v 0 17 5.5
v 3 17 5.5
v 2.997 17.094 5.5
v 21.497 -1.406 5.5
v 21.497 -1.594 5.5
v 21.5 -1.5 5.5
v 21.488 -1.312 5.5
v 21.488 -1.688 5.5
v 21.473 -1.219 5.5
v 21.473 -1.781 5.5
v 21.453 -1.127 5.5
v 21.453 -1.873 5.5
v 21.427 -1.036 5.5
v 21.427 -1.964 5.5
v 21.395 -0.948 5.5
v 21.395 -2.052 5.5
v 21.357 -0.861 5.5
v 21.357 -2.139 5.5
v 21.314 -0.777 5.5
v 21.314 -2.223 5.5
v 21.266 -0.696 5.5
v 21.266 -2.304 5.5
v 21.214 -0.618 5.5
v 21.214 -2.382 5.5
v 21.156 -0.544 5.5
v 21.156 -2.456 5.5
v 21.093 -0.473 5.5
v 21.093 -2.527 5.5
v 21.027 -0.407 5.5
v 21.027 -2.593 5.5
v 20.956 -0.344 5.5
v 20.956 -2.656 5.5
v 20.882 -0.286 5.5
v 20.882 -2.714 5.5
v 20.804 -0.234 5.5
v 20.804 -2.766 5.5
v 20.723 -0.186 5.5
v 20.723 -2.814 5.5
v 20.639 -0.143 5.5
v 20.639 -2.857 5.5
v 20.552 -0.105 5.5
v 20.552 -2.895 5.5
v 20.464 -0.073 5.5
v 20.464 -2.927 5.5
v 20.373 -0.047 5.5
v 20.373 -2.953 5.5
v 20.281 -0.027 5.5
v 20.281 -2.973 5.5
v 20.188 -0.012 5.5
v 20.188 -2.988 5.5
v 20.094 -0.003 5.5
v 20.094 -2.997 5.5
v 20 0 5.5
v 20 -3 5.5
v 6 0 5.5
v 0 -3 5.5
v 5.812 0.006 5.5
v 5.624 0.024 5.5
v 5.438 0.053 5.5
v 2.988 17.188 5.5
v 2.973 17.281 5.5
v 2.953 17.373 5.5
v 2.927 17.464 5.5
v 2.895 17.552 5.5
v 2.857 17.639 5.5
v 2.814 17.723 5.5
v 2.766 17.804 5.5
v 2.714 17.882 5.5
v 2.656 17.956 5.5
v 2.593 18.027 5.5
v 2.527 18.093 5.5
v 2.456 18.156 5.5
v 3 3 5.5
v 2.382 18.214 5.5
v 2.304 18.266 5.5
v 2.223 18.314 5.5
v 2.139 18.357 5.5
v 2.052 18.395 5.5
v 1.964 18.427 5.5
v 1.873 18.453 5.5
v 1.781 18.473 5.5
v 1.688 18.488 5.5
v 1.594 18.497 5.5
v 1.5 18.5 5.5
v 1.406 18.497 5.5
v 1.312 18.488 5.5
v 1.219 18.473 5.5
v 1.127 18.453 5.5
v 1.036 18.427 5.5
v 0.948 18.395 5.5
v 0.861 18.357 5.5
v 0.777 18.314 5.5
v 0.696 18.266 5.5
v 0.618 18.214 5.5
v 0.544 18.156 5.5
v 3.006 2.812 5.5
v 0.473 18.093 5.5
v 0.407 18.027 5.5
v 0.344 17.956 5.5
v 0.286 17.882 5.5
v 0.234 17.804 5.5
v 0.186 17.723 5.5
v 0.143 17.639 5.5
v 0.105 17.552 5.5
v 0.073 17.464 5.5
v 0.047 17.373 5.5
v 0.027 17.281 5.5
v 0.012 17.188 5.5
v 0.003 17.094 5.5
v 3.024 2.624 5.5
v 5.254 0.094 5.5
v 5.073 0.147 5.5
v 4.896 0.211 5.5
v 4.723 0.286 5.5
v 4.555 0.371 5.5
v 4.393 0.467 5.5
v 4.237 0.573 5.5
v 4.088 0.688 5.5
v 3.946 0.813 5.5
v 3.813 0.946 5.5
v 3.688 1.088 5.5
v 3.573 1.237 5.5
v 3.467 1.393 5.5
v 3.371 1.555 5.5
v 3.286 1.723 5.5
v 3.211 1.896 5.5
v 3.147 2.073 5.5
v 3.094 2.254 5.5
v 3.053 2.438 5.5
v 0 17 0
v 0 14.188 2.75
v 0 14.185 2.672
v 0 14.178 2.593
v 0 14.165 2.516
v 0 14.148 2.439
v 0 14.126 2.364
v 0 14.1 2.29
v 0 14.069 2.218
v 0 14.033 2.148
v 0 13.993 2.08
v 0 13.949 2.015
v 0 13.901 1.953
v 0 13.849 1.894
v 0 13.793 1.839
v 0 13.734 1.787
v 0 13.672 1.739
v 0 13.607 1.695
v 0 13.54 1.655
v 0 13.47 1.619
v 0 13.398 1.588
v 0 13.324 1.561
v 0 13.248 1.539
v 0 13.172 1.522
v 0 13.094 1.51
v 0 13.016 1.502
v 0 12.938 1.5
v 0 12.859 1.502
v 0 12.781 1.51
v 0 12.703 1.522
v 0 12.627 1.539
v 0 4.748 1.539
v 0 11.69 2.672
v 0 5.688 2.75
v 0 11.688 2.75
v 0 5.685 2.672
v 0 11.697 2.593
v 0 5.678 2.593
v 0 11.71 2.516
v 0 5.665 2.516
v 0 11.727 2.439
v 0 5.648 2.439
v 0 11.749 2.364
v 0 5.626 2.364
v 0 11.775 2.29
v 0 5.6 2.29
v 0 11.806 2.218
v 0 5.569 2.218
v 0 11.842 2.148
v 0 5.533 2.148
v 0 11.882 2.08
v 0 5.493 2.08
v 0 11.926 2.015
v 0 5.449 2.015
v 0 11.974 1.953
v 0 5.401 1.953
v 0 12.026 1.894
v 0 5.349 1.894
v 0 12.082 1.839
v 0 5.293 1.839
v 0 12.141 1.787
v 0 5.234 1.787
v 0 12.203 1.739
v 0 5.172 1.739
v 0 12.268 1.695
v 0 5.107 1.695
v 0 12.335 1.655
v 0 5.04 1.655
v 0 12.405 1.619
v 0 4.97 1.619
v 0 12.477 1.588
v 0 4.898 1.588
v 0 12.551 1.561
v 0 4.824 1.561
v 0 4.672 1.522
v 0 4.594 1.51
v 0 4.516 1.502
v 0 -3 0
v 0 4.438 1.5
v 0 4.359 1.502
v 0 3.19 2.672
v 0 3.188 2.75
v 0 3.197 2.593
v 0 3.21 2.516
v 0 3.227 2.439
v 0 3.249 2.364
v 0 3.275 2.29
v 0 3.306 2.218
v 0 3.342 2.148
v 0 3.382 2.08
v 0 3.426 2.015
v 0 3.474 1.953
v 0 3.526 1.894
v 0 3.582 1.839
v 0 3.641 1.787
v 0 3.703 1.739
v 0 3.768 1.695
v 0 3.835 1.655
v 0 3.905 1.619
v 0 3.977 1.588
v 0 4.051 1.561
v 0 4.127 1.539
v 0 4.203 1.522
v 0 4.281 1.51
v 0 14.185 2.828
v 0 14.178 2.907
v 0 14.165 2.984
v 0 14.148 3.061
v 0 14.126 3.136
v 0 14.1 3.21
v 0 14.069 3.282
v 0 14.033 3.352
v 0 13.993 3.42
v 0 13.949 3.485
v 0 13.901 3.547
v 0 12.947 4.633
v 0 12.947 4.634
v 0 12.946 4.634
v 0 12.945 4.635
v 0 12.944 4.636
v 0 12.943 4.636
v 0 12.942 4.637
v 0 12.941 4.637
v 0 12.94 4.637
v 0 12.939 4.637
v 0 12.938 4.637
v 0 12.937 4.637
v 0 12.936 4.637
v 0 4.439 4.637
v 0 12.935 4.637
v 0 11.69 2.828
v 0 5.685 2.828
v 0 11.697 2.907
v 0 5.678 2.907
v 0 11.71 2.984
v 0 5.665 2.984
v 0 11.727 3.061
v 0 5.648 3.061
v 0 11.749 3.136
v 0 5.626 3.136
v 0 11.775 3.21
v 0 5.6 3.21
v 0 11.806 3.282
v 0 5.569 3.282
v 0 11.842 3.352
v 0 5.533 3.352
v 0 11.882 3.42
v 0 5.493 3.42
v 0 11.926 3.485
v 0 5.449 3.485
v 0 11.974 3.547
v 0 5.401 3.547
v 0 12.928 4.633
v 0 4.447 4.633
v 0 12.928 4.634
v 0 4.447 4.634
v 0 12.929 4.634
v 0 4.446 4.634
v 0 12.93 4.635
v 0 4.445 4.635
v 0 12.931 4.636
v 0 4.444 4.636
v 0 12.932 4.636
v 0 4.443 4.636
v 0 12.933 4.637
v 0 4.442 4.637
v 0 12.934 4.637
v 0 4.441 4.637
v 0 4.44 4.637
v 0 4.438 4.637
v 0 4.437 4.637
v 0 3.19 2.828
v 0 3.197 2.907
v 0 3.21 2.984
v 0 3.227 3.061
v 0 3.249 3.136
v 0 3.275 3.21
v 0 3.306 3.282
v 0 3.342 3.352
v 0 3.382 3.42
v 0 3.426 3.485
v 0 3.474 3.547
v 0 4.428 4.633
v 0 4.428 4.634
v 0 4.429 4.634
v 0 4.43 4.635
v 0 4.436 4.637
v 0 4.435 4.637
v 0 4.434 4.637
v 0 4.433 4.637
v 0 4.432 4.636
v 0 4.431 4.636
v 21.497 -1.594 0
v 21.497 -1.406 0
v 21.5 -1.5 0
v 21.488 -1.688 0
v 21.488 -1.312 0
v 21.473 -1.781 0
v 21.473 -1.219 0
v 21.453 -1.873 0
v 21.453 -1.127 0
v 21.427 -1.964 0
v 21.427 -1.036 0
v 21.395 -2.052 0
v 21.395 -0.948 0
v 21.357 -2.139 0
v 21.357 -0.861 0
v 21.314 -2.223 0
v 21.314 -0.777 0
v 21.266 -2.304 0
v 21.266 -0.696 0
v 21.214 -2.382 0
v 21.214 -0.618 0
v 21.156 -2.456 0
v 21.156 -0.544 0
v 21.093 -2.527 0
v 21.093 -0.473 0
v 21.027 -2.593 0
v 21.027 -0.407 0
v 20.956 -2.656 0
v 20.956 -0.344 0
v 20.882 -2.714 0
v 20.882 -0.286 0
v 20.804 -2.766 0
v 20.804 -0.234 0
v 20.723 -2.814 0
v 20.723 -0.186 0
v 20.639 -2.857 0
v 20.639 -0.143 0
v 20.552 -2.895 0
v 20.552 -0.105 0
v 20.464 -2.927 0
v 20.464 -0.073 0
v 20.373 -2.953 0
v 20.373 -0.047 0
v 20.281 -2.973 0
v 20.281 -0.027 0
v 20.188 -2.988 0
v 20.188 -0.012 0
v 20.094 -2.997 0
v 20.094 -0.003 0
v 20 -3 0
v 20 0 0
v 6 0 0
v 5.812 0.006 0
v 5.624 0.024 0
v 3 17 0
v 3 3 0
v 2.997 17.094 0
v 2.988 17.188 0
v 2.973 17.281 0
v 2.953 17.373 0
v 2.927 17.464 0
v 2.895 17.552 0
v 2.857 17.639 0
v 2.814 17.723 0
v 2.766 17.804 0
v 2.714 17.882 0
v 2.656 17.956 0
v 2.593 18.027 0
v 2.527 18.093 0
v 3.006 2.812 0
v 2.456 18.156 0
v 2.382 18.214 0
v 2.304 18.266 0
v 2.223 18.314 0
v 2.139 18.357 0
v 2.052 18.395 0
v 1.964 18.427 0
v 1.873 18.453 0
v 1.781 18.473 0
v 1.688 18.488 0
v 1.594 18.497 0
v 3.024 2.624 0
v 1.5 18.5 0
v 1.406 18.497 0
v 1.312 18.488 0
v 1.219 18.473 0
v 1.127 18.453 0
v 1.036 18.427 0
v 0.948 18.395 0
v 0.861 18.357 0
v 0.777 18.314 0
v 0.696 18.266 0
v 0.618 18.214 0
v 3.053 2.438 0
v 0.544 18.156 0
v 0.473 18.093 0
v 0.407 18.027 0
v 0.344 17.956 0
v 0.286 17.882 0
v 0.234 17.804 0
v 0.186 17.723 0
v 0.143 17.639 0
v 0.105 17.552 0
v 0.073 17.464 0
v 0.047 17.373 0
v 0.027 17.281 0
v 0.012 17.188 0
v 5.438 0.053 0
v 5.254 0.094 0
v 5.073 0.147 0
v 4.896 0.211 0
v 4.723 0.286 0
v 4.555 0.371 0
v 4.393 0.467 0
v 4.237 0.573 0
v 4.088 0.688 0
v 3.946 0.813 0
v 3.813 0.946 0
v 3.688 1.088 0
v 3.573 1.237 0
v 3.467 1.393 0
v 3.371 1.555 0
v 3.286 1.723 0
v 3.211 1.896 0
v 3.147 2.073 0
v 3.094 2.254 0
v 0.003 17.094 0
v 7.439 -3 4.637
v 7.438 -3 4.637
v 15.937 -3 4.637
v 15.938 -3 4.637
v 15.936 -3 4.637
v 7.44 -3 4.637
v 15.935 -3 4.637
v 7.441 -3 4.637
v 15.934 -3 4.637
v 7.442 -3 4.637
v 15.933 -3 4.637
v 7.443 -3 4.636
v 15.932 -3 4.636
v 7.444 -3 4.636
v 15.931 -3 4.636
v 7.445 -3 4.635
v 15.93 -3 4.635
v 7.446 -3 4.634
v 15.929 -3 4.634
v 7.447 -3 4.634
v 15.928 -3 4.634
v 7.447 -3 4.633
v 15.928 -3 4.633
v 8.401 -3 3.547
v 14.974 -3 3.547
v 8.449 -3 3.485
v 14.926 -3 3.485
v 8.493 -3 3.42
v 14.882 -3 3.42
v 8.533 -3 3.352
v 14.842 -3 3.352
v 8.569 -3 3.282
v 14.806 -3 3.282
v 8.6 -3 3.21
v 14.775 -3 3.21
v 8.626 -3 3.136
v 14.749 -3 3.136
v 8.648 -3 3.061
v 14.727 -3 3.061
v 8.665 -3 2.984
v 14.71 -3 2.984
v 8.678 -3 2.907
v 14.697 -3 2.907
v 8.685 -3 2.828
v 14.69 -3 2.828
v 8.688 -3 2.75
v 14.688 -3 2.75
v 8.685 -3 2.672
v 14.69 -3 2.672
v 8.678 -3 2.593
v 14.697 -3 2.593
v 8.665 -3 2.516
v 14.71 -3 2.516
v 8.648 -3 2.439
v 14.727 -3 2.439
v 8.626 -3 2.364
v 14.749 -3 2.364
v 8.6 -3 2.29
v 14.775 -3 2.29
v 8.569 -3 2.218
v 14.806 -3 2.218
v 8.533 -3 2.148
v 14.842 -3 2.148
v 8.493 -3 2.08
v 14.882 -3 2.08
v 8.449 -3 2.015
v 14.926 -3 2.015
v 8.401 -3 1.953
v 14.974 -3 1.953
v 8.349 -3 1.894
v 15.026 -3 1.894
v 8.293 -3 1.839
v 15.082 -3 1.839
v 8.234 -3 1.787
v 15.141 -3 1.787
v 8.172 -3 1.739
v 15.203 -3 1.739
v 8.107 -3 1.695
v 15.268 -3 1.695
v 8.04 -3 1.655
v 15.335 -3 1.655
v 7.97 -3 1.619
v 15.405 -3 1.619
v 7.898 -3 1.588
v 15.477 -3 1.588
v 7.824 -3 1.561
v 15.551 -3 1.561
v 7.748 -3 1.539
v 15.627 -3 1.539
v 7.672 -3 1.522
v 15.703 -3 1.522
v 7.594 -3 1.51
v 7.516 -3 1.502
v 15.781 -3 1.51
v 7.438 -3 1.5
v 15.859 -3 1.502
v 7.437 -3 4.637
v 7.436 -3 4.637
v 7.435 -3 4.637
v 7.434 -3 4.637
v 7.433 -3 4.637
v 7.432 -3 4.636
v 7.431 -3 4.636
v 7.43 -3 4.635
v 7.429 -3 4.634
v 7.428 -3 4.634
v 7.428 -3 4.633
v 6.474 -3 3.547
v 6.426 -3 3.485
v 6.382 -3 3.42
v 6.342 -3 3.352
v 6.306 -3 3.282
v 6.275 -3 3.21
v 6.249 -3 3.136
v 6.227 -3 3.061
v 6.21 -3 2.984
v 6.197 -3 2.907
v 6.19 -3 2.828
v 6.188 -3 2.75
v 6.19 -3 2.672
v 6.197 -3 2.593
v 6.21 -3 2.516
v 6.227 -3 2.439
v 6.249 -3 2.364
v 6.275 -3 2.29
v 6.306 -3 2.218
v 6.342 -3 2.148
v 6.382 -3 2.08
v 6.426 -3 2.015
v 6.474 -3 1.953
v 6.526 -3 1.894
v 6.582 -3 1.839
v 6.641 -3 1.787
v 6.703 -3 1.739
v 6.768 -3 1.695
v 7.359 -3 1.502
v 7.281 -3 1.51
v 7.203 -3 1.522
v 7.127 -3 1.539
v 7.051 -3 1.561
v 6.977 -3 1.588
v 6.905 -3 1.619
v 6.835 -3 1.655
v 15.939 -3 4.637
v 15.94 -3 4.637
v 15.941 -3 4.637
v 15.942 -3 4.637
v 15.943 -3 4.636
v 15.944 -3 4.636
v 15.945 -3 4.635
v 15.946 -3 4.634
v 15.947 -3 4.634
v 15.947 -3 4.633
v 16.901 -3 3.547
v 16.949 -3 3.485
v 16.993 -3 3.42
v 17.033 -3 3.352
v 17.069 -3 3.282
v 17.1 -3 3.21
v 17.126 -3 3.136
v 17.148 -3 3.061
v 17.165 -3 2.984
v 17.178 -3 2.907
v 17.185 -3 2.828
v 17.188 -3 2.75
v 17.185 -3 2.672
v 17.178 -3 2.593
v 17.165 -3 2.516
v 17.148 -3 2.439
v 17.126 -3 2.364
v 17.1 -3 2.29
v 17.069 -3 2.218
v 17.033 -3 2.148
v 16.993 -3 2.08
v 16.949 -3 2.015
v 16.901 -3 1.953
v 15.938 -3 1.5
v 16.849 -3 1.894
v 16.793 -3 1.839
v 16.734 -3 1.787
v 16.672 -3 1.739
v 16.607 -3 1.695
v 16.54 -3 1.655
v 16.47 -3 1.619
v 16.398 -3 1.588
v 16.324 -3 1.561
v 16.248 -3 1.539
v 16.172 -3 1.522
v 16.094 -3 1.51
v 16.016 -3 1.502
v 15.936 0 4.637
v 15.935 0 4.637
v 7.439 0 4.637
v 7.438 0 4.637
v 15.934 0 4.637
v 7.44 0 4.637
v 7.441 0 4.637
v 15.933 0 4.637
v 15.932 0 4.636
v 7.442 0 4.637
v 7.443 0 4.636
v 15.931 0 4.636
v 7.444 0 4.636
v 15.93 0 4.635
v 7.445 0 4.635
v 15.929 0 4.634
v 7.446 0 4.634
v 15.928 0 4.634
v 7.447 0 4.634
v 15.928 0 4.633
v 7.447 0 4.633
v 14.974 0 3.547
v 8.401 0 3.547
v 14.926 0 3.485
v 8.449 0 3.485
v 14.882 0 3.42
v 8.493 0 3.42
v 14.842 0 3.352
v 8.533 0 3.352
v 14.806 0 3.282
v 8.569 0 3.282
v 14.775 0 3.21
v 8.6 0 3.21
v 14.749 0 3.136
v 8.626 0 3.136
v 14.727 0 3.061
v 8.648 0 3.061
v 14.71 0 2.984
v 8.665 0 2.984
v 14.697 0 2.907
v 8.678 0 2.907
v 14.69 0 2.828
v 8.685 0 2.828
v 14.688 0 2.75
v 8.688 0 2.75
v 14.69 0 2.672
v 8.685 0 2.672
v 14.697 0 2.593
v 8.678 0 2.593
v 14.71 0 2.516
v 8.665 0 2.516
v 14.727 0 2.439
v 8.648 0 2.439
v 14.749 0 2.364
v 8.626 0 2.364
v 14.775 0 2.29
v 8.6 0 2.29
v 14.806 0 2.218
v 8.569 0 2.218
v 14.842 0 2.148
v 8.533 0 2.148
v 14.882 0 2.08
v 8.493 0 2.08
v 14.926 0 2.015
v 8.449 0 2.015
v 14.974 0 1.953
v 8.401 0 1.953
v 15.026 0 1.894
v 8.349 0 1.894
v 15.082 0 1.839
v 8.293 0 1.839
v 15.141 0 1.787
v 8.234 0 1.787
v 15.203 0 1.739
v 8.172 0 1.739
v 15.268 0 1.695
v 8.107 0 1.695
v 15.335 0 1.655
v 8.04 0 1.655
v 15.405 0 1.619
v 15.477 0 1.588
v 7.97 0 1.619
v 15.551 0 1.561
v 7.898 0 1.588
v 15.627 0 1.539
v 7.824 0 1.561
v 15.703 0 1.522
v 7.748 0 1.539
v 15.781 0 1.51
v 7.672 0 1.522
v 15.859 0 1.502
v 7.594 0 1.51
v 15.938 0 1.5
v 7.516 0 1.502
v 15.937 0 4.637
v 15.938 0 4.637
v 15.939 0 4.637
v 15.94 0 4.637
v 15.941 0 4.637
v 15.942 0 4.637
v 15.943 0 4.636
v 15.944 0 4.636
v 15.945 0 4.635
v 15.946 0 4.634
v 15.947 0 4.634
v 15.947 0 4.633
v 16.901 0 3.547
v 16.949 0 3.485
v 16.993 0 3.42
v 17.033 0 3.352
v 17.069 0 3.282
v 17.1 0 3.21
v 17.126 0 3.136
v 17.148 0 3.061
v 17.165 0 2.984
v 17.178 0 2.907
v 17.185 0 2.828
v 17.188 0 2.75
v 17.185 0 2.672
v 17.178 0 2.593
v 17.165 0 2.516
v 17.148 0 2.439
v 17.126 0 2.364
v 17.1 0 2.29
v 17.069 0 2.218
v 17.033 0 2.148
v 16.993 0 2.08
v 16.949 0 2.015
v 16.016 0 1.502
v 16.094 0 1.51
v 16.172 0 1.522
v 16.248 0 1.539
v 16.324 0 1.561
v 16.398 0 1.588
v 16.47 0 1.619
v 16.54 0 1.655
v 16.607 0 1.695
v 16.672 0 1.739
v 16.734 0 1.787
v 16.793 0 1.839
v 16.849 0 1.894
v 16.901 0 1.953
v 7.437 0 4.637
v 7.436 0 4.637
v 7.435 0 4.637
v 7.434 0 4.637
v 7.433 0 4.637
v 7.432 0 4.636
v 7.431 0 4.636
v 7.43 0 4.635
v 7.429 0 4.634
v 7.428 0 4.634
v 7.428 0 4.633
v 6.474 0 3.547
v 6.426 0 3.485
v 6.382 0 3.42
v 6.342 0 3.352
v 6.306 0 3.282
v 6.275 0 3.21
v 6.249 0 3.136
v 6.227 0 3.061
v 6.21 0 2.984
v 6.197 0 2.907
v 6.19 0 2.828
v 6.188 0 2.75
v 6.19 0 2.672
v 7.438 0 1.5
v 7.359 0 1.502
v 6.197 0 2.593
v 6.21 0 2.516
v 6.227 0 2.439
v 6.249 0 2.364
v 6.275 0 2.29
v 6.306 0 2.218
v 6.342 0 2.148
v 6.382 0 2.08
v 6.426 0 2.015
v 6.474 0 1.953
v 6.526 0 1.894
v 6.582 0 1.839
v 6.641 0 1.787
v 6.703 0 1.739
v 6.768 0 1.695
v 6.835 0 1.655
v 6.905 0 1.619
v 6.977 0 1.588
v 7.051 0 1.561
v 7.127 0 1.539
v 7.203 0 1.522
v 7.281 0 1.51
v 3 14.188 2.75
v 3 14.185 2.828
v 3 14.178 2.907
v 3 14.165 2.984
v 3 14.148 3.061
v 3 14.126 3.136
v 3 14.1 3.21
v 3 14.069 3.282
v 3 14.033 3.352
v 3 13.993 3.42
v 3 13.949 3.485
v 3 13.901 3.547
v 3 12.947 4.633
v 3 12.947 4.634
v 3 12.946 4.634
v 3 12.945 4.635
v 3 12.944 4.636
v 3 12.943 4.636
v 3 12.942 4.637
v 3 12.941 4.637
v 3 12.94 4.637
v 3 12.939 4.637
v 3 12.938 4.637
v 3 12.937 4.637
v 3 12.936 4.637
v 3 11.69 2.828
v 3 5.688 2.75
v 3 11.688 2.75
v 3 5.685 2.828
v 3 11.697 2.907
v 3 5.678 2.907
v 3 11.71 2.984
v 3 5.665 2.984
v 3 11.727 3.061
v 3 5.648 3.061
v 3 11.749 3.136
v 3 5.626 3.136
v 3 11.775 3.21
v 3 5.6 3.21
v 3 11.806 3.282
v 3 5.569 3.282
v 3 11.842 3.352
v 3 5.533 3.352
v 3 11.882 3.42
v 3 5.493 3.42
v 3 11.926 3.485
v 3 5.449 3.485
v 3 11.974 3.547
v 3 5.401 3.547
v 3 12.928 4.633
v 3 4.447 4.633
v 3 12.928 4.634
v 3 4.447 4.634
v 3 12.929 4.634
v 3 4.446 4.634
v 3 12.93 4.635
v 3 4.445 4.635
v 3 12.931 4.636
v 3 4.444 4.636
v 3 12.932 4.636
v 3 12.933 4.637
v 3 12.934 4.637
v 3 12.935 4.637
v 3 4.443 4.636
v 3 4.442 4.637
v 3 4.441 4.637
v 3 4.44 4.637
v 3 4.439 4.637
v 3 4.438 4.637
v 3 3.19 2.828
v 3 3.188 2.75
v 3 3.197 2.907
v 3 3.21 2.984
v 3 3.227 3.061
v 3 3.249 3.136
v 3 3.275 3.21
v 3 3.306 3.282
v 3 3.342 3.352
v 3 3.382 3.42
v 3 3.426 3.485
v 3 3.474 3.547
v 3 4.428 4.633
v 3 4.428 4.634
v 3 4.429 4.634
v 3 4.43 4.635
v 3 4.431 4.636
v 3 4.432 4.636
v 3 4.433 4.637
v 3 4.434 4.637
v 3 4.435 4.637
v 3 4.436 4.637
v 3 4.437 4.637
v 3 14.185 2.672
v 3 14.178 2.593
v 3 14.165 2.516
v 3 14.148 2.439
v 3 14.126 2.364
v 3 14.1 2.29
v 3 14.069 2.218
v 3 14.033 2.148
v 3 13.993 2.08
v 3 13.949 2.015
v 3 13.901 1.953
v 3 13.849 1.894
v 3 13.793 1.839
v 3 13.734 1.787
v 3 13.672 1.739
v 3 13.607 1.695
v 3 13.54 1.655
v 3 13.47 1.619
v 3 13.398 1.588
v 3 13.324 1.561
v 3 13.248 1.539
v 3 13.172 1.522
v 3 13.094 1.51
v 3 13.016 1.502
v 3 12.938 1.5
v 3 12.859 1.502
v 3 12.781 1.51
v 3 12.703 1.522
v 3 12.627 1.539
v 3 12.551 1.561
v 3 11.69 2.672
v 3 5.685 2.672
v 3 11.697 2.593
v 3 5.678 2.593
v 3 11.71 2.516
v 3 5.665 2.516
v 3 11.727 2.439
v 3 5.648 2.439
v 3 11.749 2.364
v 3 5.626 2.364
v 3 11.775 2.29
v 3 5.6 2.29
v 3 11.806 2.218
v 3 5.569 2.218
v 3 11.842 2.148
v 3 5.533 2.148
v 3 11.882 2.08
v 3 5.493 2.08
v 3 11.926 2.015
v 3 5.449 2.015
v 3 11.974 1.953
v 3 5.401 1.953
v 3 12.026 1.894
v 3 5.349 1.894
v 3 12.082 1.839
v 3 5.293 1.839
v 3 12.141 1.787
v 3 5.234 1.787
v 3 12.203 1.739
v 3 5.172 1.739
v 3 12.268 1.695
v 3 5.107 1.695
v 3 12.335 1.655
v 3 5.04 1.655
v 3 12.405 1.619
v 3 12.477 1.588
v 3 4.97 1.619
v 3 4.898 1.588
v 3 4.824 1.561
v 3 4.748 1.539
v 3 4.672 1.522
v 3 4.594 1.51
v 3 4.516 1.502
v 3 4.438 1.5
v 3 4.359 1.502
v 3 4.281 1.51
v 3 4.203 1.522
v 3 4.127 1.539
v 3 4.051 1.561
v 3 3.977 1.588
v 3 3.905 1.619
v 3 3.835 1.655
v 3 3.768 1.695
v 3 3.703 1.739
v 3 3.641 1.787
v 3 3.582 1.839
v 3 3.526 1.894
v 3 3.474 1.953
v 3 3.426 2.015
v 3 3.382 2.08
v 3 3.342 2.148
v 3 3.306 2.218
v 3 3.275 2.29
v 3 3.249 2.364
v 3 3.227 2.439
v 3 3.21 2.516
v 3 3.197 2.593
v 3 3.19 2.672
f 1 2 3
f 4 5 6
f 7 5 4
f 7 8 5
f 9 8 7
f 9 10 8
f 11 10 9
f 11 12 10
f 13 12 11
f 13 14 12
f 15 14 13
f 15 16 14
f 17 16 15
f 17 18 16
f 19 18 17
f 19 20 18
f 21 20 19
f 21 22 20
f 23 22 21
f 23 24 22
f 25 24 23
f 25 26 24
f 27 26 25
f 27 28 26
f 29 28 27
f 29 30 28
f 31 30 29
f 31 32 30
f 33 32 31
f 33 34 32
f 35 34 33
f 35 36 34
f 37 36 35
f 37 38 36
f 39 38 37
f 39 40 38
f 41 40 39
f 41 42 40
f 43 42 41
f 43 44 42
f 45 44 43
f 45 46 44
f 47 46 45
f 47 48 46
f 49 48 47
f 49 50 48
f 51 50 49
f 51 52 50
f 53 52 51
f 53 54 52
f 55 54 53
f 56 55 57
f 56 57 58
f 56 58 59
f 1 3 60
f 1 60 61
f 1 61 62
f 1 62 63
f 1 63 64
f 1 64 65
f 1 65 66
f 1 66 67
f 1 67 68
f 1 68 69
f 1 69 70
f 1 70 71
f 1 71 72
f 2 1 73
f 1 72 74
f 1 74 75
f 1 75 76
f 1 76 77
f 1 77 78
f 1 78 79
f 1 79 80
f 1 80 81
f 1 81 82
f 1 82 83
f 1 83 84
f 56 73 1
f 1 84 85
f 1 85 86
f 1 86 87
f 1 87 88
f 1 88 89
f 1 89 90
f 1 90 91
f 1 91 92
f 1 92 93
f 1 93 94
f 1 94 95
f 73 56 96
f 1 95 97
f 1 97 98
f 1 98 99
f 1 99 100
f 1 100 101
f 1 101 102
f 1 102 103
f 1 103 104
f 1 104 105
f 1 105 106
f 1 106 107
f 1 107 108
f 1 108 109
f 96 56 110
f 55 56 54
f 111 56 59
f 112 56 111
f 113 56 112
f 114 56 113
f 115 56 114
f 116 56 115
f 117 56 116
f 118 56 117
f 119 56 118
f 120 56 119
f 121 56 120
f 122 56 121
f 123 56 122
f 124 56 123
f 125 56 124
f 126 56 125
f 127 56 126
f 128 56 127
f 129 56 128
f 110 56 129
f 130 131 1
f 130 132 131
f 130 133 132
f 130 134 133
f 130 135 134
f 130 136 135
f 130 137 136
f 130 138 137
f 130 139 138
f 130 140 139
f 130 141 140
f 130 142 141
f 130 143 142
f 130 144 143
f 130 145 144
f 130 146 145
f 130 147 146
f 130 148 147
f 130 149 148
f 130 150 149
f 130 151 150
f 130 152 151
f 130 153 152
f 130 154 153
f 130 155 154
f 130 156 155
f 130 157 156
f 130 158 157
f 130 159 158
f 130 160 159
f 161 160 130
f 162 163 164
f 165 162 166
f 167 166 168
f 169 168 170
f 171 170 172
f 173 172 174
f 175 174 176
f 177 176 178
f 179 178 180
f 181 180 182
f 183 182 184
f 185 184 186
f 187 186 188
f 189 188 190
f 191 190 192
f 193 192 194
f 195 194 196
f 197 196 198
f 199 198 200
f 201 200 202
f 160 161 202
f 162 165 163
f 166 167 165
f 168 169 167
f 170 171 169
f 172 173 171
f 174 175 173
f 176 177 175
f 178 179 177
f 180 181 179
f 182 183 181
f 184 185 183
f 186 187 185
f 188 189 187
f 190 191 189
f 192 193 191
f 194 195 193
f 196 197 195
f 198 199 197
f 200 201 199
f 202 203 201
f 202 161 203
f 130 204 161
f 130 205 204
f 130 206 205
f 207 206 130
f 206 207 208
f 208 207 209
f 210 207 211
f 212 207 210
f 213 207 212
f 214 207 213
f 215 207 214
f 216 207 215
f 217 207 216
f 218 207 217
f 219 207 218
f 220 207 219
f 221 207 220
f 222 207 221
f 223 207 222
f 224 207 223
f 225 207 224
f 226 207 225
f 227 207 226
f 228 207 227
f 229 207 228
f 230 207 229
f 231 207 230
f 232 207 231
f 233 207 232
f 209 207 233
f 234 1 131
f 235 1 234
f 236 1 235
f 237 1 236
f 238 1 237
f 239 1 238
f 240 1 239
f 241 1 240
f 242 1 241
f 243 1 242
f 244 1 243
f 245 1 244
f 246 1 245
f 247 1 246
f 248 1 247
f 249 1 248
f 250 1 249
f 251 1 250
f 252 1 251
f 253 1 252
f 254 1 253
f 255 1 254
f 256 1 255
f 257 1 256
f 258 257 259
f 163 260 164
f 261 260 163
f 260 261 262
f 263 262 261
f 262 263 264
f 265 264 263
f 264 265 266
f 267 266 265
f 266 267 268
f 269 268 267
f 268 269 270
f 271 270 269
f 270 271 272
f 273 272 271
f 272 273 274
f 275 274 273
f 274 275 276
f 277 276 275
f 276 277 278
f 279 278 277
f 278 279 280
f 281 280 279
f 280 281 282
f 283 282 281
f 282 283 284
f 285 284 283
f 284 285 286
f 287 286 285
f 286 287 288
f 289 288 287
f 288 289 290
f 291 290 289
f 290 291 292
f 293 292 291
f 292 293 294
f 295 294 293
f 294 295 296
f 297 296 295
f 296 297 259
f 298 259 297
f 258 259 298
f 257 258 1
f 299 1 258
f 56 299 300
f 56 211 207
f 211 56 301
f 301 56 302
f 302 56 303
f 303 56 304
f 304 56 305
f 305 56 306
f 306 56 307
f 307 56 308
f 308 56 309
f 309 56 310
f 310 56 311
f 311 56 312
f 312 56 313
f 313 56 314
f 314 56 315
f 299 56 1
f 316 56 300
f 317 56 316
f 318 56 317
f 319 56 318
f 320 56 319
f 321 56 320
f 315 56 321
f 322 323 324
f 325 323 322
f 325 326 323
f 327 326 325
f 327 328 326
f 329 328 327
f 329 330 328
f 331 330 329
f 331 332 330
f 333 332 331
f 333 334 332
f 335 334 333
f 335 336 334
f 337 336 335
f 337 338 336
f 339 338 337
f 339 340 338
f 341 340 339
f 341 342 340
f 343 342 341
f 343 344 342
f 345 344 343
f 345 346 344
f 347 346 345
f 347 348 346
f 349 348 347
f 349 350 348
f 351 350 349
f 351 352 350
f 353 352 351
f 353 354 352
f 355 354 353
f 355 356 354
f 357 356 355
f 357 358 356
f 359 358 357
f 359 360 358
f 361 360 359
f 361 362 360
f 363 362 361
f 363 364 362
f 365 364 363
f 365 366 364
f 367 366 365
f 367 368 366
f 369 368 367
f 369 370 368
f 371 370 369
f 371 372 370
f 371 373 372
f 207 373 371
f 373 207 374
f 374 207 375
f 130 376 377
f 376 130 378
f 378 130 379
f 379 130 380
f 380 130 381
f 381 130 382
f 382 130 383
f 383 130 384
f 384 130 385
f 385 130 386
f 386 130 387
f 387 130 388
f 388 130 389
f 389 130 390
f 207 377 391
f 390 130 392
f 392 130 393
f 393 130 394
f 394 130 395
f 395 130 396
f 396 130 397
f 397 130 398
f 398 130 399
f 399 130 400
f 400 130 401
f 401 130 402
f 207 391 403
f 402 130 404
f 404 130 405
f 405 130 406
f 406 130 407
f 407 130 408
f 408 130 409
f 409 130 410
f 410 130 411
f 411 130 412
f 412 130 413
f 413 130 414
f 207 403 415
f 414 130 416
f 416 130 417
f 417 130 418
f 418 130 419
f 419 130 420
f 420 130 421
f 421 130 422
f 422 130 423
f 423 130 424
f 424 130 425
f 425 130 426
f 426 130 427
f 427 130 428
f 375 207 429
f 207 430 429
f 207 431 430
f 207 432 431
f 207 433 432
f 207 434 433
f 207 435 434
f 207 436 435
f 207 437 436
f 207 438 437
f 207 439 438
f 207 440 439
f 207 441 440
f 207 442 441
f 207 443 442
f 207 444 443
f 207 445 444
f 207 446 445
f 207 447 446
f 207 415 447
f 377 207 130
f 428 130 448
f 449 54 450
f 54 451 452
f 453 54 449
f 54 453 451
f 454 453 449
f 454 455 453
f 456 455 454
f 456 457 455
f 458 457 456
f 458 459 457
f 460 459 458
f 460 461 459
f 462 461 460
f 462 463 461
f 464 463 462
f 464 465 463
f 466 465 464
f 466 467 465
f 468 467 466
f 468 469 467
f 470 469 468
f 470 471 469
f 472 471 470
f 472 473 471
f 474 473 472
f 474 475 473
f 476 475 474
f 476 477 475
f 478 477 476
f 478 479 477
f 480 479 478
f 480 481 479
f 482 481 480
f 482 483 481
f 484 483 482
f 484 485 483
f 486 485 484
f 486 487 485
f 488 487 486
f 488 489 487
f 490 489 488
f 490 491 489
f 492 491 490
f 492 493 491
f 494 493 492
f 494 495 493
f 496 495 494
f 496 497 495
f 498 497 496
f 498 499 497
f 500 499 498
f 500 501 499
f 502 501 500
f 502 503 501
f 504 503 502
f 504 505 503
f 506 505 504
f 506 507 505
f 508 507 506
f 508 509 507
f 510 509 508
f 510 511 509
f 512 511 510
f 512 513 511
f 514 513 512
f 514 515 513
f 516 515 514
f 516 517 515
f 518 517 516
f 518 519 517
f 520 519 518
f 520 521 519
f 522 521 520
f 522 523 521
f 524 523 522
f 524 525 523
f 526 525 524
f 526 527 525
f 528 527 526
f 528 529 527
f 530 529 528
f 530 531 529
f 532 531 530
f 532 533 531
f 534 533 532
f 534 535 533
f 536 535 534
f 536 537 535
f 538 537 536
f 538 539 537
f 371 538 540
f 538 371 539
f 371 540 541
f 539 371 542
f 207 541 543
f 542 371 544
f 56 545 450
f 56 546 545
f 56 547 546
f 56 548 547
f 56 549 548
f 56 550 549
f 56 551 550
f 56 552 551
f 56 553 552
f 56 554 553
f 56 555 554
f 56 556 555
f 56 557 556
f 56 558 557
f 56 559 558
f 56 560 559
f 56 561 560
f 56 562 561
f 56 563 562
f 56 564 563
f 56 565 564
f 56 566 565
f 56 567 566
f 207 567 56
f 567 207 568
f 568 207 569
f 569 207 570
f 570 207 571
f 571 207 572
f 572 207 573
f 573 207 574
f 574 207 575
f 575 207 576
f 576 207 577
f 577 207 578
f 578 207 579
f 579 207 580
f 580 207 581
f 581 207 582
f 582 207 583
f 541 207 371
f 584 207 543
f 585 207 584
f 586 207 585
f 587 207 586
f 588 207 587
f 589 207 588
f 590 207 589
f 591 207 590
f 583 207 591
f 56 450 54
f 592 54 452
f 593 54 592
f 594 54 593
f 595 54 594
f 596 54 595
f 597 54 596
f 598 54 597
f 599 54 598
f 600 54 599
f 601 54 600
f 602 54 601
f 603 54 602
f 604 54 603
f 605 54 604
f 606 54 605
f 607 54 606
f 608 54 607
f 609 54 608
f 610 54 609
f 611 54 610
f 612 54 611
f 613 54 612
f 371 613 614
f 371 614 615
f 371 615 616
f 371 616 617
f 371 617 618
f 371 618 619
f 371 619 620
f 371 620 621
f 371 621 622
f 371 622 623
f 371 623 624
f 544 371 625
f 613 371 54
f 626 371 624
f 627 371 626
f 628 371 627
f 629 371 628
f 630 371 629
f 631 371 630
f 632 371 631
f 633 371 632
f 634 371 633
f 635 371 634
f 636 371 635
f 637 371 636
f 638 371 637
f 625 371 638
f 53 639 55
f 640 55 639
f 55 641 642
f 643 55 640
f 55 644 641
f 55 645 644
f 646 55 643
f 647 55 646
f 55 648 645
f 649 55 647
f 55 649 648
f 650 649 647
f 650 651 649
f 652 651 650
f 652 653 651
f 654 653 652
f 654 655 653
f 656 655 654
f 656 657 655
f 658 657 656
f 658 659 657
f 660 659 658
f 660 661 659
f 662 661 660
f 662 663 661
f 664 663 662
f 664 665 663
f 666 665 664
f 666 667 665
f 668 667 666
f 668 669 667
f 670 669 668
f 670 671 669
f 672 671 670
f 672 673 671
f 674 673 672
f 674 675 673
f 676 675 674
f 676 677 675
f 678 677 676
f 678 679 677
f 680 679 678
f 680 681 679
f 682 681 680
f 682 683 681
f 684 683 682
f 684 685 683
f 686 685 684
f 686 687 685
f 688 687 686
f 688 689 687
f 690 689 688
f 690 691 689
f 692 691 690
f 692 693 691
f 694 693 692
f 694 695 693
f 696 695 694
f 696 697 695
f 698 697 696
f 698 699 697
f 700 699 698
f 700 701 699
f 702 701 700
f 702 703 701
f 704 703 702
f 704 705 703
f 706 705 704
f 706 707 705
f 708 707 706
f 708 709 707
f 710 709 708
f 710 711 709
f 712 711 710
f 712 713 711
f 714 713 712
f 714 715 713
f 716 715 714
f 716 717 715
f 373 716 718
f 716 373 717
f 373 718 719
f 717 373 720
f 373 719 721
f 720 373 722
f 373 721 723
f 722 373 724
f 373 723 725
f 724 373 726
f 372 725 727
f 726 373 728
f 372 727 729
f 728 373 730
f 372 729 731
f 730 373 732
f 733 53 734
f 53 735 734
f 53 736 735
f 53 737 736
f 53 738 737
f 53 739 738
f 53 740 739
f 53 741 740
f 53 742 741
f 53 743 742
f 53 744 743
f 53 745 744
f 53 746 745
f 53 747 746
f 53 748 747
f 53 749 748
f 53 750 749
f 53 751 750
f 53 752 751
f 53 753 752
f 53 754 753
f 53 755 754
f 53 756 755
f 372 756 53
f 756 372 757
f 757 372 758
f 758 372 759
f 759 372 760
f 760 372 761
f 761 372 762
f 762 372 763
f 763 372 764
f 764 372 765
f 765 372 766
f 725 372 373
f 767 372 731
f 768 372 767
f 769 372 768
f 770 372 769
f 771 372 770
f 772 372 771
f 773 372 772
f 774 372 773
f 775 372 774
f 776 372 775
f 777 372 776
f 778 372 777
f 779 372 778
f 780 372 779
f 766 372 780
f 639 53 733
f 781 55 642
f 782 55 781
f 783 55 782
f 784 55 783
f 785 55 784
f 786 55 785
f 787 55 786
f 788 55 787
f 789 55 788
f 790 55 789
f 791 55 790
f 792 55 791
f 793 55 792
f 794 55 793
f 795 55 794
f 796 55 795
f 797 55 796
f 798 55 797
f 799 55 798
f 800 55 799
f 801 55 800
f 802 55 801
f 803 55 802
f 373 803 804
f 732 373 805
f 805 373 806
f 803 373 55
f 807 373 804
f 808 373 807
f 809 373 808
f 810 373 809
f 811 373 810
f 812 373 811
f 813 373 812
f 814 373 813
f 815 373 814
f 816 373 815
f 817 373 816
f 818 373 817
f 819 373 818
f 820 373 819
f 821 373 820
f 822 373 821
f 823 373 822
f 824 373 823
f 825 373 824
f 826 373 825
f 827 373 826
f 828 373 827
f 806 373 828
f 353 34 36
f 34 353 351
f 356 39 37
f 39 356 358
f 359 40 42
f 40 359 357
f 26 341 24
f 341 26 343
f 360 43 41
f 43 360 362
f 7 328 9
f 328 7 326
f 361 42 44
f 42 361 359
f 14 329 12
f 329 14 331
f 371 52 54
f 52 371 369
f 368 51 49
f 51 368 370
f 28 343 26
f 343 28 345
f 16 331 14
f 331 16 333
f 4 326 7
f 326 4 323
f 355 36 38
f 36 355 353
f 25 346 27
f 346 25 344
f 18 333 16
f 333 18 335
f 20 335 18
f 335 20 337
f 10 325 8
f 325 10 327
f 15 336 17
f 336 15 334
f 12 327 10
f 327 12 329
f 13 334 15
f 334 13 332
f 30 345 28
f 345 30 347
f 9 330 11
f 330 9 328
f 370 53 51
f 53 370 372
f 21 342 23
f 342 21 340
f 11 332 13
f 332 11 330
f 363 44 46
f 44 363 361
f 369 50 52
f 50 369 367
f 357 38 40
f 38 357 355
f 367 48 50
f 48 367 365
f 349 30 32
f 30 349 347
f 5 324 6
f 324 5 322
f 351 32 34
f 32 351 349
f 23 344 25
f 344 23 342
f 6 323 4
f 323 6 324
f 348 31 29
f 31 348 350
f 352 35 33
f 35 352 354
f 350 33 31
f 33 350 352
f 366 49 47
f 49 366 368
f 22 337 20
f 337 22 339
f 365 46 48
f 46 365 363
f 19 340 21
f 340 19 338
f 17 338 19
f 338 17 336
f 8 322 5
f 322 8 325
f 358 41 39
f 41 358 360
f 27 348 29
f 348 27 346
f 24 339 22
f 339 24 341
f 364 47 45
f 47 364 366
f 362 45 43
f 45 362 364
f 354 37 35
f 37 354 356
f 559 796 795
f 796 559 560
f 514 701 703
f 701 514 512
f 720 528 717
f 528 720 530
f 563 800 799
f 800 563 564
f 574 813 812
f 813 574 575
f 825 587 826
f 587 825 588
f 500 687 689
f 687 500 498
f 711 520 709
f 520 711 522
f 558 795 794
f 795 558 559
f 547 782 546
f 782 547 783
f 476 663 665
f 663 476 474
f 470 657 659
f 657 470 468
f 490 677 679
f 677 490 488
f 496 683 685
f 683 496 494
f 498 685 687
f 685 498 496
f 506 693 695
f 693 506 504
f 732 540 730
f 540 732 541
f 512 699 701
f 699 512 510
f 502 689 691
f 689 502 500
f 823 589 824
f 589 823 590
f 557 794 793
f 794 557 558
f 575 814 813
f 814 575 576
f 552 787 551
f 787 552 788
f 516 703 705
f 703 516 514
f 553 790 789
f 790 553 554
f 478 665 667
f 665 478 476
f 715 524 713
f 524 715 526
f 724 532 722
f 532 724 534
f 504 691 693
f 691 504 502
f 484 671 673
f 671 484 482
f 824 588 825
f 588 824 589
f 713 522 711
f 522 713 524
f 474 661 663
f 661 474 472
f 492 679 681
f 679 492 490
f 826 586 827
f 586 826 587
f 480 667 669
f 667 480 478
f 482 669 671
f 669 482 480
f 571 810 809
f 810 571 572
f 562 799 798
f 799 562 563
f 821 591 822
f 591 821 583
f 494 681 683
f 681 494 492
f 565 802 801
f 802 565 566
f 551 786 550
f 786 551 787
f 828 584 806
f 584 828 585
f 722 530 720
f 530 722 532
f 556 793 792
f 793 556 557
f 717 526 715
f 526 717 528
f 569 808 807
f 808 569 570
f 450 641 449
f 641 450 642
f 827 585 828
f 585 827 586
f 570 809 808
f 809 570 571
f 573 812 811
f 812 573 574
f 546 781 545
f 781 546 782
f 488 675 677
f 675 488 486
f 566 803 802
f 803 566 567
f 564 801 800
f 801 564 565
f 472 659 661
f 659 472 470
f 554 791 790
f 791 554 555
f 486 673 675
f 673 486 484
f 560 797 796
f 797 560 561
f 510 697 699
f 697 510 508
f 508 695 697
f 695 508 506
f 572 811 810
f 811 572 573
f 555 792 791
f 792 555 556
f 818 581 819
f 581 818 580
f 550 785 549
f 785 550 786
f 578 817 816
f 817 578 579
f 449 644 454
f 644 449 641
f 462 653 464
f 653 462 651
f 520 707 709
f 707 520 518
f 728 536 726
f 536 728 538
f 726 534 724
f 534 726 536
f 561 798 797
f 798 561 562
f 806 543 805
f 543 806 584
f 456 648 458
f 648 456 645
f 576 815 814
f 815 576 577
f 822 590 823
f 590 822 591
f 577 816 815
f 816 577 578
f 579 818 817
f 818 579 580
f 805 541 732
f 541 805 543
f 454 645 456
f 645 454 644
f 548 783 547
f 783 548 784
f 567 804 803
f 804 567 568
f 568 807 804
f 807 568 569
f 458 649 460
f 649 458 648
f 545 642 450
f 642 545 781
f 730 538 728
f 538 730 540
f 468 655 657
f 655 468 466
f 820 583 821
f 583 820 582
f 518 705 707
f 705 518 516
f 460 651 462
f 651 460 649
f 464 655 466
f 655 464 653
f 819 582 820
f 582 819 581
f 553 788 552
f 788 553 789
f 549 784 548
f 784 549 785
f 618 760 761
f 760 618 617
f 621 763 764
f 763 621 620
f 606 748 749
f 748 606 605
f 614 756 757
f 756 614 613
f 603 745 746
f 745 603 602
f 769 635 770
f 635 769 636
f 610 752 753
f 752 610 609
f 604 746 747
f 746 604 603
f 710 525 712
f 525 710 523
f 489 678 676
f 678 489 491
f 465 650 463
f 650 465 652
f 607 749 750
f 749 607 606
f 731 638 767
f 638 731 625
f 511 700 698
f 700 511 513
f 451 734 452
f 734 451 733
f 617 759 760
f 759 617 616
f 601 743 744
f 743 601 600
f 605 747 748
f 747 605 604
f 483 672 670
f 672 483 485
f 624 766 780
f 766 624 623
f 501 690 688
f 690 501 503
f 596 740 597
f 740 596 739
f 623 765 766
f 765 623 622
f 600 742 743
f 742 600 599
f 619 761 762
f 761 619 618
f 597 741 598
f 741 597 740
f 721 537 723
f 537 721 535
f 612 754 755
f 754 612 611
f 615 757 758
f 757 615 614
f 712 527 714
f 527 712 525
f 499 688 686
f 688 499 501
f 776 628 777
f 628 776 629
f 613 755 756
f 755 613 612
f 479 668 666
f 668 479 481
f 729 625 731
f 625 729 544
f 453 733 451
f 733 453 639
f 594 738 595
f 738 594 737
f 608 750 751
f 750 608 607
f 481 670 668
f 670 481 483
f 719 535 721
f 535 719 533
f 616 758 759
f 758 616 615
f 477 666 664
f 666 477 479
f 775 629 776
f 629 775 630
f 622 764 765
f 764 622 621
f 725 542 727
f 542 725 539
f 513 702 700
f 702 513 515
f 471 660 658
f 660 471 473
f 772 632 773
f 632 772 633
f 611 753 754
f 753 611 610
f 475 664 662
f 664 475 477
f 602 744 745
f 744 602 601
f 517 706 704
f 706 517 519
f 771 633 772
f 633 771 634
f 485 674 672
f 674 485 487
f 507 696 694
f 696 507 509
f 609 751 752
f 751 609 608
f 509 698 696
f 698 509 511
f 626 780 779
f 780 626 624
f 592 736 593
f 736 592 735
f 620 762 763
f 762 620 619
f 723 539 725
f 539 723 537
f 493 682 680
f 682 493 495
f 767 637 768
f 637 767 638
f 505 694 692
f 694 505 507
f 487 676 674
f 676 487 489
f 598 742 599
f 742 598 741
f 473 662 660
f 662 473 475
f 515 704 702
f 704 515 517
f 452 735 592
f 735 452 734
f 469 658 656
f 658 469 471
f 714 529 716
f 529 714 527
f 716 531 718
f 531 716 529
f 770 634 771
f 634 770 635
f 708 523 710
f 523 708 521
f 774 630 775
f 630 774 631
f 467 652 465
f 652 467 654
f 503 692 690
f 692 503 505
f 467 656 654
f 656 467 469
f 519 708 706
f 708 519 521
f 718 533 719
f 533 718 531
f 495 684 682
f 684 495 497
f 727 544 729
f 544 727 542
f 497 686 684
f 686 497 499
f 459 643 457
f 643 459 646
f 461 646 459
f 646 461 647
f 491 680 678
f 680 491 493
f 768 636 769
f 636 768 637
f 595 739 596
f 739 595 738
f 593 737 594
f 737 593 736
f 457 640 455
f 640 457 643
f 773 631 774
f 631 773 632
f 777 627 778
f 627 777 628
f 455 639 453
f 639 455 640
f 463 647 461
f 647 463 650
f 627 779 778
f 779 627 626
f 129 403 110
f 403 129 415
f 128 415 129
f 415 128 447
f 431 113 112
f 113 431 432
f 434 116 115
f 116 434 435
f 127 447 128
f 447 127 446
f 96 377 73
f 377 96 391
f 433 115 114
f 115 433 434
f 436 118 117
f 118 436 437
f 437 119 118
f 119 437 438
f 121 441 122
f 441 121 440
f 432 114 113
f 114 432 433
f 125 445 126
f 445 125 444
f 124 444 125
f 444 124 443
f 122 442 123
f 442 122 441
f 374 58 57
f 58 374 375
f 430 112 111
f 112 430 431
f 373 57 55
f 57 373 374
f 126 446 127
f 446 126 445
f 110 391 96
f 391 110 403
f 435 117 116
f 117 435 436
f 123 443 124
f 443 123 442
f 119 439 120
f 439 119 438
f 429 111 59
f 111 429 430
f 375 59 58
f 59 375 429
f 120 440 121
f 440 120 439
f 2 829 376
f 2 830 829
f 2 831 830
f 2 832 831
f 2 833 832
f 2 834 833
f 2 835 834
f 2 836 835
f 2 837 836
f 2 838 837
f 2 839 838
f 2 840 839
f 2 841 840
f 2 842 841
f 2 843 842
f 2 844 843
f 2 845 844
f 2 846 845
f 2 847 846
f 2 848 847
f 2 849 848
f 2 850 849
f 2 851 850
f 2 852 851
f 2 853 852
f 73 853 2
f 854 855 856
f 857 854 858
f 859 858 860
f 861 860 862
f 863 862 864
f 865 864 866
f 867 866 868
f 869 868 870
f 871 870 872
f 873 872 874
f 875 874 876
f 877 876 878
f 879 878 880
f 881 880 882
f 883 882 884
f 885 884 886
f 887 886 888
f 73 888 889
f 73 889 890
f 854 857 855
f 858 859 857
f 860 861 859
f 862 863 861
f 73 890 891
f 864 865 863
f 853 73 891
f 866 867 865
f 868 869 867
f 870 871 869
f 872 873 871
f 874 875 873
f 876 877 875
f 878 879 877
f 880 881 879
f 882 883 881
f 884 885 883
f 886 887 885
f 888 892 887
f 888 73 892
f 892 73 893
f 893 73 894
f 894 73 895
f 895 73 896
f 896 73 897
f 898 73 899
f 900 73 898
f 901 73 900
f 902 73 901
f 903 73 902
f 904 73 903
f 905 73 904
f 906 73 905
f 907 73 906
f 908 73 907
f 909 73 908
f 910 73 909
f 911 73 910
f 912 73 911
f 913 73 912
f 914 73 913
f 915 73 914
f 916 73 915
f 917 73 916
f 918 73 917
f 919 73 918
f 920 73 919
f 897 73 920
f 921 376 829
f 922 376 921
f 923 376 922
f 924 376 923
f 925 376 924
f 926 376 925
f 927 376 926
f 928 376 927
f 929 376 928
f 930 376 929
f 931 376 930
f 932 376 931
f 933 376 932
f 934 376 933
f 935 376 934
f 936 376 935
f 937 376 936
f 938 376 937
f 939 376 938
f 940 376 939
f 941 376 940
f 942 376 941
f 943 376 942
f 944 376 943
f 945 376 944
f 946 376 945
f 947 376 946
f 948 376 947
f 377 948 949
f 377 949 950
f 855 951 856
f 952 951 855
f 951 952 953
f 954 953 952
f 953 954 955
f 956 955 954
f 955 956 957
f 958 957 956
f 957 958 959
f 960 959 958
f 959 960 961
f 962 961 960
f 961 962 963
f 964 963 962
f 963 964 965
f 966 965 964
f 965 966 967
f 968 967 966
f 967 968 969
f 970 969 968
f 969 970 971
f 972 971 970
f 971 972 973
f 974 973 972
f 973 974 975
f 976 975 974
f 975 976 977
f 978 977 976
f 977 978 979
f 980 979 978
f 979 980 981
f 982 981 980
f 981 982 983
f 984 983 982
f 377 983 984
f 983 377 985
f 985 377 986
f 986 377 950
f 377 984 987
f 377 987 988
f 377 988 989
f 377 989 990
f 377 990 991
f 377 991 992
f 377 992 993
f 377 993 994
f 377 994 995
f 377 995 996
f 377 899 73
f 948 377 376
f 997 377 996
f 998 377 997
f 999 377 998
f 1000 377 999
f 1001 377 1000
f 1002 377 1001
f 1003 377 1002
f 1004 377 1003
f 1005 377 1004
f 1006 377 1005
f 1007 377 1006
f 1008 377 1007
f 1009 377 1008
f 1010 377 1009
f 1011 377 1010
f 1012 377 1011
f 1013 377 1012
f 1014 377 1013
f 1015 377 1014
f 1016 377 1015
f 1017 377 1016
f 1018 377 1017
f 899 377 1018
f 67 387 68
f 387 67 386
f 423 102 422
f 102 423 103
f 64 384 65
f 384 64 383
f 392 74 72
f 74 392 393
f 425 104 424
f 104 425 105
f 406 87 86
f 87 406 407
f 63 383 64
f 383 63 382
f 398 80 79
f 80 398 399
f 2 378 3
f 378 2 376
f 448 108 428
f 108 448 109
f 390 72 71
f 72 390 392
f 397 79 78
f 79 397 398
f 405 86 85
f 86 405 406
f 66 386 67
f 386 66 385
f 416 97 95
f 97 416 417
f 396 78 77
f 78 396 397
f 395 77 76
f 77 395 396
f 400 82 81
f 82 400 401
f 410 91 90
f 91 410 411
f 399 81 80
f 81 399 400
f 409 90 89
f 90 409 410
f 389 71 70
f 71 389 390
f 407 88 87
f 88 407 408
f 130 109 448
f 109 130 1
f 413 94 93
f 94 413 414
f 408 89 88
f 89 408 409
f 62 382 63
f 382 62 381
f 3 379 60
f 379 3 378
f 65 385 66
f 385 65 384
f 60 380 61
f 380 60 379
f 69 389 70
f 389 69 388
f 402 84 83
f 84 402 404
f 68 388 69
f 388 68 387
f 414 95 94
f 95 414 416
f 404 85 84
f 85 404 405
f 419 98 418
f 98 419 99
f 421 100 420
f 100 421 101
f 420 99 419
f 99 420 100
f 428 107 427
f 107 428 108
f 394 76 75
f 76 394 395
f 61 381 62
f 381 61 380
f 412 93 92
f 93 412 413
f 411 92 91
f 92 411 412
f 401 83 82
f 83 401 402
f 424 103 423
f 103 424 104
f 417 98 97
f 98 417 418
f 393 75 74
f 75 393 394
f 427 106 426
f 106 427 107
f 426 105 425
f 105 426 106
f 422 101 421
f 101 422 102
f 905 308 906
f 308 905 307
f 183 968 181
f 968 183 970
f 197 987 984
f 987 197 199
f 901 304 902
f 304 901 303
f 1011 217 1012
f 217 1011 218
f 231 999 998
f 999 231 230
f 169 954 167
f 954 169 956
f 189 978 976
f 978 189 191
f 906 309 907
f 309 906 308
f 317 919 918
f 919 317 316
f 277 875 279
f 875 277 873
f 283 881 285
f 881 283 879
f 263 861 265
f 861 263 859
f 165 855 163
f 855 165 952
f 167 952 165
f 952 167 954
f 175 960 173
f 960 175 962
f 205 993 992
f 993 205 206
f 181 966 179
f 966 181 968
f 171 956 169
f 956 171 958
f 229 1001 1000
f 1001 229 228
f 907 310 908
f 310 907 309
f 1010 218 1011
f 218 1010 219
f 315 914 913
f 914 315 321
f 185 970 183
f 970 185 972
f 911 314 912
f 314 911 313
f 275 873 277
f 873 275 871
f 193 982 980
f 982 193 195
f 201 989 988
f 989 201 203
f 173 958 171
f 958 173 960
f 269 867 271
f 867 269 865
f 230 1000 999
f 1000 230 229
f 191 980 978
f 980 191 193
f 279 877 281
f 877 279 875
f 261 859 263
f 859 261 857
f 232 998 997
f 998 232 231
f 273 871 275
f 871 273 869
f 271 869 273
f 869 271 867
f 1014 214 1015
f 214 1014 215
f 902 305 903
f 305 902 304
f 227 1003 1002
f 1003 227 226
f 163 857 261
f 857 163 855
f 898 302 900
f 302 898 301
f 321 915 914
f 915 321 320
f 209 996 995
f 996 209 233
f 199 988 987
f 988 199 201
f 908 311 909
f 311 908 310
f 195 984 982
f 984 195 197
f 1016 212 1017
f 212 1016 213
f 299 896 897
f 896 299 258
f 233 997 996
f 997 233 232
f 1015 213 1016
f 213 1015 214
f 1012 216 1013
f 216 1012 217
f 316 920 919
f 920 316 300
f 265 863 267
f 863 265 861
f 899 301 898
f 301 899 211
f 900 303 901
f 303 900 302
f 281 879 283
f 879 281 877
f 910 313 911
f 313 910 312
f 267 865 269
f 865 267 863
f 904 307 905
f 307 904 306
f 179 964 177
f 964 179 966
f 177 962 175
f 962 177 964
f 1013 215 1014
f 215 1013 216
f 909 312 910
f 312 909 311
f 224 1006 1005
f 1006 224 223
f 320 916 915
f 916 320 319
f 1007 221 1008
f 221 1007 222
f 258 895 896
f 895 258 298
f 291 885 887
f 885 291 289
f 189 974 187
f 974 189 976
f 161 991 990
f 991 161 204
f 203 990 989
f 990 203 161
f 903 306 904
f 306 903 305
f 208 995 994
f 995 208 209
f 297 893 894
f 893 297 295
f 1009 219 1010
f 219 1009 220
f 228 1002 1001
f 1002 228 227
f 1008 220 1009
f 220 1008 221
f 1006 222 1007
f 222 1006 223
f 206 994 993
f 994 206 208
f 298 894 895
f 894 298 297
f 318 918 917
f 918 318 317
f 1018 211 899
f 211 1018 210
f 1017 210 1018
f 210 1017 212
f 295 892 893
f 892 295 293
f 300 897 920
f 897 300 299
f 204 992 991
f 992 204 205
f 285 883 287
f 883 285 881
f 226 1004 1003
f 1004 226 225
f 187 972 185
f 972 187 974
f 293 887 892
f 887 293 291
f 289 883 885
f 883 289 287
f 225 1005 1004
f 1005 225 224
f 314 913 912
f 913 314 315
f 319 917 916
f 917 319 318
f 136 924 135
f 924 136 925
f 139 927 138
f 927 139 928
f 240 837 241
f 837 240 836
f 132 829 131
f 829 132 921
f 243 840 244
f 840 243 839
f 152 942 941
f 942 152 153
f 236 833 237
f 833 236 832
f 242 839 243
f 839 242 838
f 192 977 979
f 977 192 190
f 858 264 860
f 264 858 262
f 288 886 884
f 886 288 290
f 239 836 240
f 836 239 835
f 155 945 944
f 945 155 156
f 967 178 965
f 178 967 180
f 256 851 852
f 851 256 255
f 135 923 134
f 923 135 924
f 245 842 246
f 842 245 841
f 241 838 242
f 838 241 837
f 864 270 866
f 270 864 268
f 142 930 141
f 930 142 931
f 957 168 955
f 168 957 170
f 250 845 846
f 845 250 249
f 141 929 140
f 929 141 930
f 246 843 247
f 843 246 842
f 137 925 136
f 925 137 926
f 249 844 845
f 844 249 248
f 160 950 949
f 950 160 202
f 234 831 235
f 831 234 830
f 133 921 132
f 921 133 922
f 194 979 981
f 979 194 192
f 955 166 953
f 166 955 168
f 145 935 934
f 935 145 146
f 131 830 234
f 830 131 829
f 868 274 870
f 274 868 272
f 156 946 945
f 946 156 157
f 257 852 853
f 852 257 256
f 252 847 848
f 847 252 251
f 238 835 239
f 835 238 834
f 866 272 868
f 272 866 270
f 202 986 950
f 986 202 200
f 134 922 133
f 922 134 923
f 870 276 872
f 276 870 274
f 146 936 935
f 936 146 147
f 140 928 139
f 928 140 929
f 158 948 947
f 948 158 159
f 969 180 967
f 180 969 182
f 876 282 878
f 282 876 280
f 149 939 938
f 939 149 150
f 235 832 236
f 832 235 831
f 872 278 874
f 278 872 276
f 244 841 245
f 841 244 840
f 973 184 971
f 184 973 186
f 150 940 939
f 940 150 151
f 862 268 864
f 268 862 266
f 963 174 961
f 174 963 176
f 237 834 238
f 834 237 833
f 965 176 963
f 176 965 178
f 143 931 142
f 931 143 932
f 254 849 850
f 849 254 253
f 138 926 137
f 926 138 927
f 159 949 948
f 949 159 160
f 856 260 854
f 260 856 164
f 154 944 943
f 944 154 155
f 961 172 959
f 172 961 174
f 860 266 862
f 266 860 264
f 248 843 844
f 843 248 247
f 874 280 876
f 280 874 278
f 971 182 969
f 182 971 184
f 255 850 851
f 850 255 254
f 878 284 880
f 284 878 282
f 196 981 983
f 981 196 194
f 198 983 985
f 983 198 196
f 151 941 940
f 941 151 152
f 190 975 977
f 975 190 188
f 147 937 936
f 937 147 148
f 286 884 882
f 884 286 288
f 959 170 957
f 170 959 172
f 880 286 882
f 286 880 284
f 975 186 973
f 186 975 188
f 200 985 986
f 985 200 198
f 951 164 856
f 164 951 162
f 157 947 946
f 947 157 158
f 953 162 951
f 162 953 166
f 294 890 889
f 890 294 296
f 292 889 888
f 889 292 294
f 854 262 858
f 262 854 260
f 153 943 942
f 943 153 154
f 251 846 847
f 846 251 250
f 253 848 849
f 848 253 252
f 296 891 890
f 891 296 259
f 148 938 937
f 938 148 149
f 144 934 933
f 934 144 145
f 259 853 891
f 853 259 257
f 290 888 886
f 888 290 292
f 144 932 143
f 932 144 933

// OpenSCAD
/*
Adjustable Corner Bracket -- Version 2
* Print Unsupported
* by Harlo_DX
* 9/11/2015
*/

//brackets sizing
//Width in of the bracket (mm): 
c_w = 5.5; //[5:0.5:100]
//Height of the bracket (mm):
c_h = 20; //[11:0.5:100]
//Depth of the bracket (mm):
c_d = 3; //[0.5:0.25:20]

//Bolt hole diameter in mm:
diameter = 2.5; //[0.25:0.25:30]

//Number of bolt holes:
bolt_holes = 2; //[0,1,2]

//Extra space between bolts:
seperation = 3; //[0.5:0.25:20]


////////////////////
//INTERNAL VARIABLES
////////////////////

hole_size = diameter/2; //radius (multiply by 2 for the diameter)
multiplier = 1*1;  // affects the smoothness of the chamfer -- keep turning up **gradually** to reduce sharp edges.
spread = c_h/5; //NOT FINAL



//////////////////////////////
////////////////////////RENDER
//////////////////////////////

rotate([0,-90,180]){
// initial side of bracket
cut_bracket(); //WORKING
// internal chamfer
corner_chamfer(); //WORKING

//bottom bracket  //WORKING
translate([0,c_d,0]){
    rotate (90, [1,0,0]){ // handles the pivot action
        cut_bracket();
        }
    }
}
//////////////////////////////
/////////////////////FUNCTIONS
//////////////////////////////    
 
module corner_chamfer () {
    
    difference(){
    //cube
    translate([0,-c_d,0]){
    cube([c_w, c_d*2, c_d*2], false);
    }
    
    //cylinder
    translate([-0.5,-c_d,c_d*2]){
        rotate(90, [0,1,0]){
        cylinder(c_w+1, c_d*multiplier, c_d*multiplier, false, $fn = 100);
        }
    }
}
    
}

module cut_bracket(){
    difference(){
        union(){
            //corner_chamfer(); //TEST
            bracket_side(); //WORKING
        }
        if (bolt_holes == 1){
            cut_out();
        }
        
        if (bolt_holes == 2){
        dual_cut_out();
        }
}
}    

module bracket_side () {
    cube([c_w, c_d, c_h], false);
    curved_tip();
}

module curved_tip () {
        translate([0,c_d/2,c_h]){
            rotate(90, [0,1,0]){
                cylinder(c_w, (c_d/2)*multiplier, (c_d/2)*multiplier, false, $fn = 100);
                }
           }
    }
    
module dual_cut_out(){
        translate([0, 0, -(hole_size + seperation)]){
        cut_out();
        }
        translate([0, 0, hole_size + seperation]){
        cut_out();
        }        
        }

module cut_out (){
    
    //This hull function lets you print without support
    hull(){
        
        $fn=100; //defines resolution

    translate([
        c_w/2
        ,c_d+1
        ,(c_h +(c_w/2)+(hole_size/2))*0.5]){
        rotate(90, [1,0,0]){
            cylinder(c_d+5, hole_size, hole_size, false);
        }
    }
    
    translate([
    (c_w/2)+((hole_size)*1.5) //Shifts across by an extra 50% of the hole_size value
    ,c_d+1
    ,(c_h+(c_w/2)+(hole_size/2))*0.5])
        {
        rotate(90, [1,0,0]){
            cylinder(c_d+5, hole_size*0.01, hole_size*0.01, false);
        }
    }
}

}
